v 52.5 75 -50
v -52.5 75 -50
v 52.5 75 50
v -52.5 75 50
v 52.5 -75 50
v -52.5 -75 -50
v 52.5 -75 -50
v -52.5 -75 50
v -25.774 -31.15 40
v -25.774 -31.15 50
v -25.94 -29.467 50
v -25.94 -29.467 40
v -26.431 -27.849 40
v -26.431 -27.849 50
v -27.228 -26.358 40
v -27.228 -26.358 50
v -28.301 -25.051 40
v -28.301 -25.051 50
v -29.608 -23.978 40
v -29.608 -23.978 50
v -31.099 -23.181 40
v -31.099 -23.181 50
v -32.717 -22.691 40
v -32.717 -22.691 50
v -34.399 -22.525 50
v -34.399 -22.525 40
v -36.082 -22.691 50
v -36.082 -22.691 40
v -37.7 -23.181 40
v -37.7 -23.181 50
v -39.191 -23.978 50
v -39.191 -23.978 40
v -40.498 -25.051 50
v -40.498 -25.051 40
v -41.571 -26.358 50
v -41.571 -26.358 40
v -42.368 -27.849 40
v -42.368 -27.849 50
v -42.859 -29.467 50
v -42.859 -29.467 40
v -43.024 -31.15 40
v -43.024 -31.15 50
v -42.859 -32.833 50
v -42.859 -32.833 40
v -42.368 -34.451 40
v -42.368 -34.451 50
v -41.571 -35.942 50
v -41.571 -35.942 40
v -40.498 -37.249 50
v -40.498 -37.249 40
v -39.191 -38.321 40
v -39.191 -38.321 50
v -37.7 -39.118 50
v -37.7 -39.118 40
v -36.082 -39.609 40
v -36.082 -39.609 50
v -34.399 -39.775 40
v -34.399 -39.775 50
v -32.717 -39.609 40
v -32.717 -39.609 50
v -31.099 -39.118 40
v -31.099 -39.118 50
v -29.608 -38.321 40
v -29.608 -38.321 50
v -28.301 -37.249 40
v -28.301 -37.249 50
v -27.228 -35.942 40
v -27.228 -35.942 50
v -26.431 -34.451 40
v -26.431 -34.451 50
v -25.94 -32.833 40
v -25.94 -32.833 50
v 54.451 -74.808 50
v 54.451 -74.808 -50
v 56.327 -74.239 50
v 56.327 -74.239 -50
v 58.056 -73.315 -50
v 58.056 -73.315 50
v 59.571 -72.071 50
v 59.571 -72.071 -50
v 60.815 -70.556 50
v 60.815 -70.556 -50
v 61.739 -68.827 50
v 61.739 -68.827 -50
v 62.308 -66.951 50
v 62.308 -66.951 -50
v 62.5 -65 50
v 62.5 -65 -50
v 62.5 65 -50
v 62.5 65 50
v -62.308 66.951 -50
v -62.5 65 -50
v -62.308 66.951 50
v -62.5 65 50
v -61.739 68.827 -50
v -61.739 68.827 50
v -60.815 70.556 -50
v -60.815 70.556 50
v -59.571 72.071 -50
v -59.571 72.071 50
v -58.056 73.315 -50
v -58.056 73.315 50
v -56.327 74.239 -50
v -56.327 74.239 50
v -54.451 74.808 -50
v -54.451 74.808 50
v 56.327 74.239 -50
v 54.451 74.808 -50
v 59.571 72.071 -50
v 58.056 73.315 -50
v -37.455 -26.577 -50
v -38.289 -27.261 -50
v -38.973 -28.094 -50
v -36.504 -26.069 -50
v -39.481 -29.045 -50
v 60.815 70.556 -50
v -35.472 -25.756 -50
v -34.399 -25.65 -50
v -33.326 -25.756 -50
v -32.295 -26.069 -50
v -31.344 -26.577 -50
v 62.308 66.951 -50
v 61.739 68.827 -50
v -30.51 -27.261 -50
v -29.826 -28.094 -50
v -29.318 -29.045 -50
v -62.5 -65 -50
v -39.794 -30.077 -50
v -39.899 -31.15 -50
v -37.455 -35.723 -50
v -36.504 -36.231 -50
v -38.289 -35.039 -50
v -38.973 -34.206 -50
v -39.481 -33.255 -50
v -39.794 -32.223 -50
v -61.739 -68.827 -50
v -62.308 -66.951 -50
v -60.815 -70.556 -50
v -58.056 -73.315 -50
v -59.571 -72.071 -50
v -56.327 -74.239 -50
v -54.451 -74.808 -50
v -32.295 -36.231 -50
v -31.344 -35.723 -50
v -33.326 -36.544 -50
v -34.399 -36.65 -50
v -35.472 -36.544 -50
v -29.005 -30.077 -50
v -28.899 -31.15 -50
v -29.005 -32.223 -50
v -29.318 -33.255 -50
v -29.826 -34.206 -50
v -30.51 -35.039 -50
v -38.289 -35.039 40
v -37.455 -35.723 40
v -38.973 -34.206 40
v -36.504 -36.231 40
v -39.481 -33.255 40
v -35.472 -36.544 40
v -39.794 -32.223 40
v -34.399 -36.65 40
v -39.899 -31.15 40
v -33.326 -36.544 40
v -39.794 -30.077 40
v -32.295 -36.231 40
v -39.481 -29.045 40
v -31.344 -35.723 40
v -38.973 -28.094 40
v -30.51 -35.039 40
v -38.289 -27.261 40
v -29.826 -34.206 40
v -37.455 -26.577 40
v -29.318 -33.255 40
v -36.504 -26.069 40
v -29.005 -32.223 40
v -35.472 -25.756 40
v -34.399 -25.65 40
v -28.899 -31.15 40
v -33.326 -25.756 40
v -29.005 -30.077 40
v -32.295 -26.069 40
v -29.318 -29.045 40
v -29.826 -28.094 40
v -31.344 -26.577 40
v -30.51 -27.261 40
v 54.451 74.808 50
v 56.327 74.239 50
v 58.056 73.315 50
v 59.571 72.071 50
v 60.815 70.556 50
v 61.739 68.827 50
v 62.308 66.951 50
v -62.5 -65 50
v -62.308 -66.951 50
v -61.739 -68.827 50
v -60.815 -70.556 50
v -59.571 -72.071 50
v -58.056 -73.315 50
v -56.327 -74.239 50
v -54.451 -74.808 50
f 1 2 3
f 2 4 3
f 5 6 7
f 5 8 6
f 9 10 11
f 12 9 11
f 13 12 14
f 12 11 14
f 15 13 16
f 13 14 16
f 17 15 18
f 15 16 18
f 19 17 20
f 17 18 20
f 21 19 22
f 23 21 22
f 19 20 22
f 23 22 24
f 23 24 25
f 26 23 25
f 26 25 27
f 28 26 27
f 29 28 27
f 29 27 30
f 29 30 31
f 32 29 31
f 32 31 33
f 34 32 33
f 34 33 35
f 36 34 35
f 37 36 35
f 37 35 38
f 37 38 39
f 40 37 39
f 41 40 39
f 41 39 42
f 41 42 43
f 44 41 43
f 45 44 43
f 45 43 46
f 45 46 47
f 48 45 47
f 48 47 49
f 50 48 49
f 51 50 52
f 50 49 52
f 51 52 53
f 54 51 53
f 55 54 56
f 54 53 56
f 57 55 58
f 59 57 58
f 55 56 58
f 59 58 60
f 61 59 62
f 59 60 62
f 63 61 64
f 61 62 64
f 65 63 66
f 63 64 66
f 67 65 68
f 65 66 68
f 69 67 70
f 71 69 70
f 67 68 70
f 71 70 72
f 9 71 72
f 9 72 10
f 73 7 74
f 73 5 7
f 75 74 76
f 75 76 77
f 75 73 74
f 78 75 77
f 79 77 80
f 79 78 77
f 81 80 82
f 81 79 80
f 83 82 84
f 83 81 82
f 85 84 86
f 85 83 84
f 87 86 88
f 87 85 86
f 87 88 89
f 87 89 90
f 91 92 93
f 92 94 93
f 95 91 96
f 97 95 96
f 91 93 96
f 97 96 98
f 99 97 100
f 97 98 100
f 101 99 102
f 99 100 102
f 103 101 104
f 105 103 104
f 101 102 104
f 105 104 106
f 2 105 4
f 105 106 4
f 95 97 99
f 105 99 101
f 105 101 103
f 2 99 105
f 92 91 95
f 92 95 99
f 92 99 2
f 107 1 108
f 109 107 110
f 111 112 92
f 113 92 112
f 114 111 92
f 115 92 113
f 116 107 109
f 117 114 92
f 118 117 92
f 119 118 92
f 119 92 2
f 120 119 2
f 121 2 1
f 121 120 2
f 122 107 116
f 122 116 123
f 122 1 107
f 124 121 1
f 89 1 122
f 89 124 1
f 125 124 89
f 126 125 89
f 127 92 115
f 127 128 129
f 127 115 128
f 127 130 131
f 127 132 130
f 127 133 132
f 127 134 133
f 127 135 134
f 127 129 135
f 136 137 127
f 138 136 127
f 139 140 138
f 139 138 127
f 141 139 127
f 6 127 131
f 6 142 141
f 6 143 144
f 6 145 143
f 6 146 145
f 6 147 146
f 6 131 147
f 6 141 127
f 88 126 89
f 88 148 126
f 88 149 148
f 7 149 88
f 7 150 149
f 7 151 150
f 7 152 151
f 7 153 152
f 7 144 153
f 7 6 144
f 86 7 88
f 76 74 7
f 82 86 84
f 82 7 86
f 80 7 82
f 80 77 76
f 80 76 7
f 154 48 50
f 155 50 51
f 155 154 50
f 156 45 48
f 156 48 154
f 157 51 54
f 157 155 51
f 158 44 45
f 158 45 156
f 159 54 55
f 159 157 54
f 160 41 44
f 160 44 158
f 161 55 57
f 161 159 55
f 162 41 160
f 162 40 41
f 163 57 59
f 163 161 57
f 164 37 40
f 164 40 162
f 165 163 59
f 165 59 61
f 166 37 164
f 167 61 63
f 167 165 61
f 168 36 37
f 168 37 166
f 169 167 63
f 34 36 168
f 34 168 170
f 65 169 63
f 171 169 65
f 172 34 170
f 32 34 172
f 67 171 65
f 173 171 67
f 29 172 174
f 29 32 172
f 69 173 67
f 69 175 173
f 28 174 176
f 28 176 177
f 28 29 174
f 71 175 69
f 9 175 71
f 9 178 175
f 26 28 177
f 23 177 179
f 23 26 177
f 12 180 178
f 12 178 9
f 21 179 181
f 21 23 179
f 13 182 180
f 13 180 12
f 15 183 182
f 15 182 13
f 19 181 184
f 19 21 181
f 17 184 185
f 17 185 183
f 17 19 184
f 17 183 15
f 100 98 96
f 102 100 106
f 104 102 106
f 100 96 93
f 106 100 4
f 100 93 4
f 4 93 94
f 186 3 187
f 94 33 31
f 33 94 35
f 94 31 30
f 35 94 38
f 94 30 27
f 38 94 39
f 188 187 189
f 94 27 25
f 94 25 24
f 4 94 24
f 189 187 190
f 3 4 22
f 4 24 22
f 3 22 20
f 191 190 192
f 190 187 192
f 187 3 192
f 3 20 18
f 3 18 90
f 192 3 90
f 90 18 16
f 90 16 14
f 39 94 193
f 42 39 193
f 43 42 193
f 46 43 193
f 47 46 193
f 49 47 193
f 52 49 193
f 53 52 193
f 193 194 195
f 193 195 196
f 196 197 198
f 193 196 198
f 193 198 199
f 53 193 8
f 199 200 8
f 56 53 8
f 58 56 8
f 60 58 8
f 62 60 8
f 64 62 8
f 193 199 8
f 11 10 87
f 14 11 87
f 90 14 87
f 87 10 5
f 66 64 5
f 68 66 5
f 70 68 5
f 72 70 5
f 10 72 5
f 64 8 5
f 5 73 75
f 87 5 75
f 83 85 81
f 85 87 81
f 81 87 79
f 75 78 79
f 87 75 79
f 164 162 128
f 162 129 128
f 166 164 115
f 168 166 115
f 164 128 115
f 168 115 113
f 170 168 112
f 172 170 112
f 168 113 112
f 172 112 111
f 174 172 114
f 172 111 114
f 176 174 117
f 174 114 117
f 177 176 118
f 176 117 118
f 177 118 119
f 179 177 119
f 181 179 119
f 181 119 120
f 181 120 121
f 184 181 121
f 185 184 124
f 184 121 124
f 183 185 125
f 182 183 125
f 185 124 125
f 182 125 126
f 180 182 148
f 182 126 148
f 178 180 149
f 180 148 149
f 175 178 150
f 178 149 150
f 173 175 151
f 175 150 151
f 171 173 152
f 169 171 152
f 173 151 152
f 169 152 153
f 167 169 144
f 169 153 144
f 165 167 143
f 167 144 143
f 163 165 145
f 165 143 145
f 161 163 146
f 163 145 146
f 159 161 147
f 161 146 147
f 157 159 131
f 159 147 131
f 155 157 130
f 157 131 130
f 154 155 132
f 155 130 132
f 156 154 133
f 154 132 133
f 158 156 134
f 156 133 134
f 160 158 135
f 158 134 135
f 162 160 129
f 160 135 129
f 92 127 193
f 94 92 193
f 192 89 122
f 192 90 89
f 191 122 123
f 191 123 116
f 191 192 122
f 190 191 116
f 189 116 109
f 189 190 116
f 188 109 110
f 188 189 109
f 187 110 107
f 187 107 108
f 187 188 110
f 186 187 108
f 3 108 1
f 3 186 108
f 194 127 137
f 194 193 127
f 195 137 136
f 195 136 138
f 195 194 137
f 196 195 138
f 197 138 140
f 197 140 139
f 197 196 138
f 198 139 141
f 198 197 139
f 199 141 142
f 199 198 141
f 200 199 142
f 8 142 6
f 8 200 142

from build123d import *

# Parameters (mm, degrees)
F0_W           = 125
F0_H           = 100
F1_DEPTH       = 75
F1_DEPTH_BACK  = 75
F2_R           = 10
F4_D           = 11
F4_CBORE_D     = 17.25
F4_CBORE_DEPTH = 10


with BuildPart() as f1:
    # F0 (on Front) → F1 (new body, two sides)
    with BuildSketch(Plane.XZ) as f1_sk:
        Rectangle(F0_W, F0_H)
    extrude(amount=F1_DEPTH)
    extrude(f1_sk.sketch, amount=-F1_DEPTH_BACK)

    # F2
    f2_edges = [f1.edges().sort_by_distance(p)[0] for p in [
        (62.5, -75, 0),
        (62.5, 75, 0),
        (-62.5, 75, 0),
        (-62.5, -75, 0),
    ]]
    fillet(f2_edges, radius=F2_R)

    # F4 (through all)
    with Locations(Plane.XY.offset(50)):
        with Locations((-34.3994386494, -31.1498884112)):
            CounterBoreHole(F4_D / 2, F4_CBORE_D / 2, F4_CBORE_DEPTH)


solid = f1.part
